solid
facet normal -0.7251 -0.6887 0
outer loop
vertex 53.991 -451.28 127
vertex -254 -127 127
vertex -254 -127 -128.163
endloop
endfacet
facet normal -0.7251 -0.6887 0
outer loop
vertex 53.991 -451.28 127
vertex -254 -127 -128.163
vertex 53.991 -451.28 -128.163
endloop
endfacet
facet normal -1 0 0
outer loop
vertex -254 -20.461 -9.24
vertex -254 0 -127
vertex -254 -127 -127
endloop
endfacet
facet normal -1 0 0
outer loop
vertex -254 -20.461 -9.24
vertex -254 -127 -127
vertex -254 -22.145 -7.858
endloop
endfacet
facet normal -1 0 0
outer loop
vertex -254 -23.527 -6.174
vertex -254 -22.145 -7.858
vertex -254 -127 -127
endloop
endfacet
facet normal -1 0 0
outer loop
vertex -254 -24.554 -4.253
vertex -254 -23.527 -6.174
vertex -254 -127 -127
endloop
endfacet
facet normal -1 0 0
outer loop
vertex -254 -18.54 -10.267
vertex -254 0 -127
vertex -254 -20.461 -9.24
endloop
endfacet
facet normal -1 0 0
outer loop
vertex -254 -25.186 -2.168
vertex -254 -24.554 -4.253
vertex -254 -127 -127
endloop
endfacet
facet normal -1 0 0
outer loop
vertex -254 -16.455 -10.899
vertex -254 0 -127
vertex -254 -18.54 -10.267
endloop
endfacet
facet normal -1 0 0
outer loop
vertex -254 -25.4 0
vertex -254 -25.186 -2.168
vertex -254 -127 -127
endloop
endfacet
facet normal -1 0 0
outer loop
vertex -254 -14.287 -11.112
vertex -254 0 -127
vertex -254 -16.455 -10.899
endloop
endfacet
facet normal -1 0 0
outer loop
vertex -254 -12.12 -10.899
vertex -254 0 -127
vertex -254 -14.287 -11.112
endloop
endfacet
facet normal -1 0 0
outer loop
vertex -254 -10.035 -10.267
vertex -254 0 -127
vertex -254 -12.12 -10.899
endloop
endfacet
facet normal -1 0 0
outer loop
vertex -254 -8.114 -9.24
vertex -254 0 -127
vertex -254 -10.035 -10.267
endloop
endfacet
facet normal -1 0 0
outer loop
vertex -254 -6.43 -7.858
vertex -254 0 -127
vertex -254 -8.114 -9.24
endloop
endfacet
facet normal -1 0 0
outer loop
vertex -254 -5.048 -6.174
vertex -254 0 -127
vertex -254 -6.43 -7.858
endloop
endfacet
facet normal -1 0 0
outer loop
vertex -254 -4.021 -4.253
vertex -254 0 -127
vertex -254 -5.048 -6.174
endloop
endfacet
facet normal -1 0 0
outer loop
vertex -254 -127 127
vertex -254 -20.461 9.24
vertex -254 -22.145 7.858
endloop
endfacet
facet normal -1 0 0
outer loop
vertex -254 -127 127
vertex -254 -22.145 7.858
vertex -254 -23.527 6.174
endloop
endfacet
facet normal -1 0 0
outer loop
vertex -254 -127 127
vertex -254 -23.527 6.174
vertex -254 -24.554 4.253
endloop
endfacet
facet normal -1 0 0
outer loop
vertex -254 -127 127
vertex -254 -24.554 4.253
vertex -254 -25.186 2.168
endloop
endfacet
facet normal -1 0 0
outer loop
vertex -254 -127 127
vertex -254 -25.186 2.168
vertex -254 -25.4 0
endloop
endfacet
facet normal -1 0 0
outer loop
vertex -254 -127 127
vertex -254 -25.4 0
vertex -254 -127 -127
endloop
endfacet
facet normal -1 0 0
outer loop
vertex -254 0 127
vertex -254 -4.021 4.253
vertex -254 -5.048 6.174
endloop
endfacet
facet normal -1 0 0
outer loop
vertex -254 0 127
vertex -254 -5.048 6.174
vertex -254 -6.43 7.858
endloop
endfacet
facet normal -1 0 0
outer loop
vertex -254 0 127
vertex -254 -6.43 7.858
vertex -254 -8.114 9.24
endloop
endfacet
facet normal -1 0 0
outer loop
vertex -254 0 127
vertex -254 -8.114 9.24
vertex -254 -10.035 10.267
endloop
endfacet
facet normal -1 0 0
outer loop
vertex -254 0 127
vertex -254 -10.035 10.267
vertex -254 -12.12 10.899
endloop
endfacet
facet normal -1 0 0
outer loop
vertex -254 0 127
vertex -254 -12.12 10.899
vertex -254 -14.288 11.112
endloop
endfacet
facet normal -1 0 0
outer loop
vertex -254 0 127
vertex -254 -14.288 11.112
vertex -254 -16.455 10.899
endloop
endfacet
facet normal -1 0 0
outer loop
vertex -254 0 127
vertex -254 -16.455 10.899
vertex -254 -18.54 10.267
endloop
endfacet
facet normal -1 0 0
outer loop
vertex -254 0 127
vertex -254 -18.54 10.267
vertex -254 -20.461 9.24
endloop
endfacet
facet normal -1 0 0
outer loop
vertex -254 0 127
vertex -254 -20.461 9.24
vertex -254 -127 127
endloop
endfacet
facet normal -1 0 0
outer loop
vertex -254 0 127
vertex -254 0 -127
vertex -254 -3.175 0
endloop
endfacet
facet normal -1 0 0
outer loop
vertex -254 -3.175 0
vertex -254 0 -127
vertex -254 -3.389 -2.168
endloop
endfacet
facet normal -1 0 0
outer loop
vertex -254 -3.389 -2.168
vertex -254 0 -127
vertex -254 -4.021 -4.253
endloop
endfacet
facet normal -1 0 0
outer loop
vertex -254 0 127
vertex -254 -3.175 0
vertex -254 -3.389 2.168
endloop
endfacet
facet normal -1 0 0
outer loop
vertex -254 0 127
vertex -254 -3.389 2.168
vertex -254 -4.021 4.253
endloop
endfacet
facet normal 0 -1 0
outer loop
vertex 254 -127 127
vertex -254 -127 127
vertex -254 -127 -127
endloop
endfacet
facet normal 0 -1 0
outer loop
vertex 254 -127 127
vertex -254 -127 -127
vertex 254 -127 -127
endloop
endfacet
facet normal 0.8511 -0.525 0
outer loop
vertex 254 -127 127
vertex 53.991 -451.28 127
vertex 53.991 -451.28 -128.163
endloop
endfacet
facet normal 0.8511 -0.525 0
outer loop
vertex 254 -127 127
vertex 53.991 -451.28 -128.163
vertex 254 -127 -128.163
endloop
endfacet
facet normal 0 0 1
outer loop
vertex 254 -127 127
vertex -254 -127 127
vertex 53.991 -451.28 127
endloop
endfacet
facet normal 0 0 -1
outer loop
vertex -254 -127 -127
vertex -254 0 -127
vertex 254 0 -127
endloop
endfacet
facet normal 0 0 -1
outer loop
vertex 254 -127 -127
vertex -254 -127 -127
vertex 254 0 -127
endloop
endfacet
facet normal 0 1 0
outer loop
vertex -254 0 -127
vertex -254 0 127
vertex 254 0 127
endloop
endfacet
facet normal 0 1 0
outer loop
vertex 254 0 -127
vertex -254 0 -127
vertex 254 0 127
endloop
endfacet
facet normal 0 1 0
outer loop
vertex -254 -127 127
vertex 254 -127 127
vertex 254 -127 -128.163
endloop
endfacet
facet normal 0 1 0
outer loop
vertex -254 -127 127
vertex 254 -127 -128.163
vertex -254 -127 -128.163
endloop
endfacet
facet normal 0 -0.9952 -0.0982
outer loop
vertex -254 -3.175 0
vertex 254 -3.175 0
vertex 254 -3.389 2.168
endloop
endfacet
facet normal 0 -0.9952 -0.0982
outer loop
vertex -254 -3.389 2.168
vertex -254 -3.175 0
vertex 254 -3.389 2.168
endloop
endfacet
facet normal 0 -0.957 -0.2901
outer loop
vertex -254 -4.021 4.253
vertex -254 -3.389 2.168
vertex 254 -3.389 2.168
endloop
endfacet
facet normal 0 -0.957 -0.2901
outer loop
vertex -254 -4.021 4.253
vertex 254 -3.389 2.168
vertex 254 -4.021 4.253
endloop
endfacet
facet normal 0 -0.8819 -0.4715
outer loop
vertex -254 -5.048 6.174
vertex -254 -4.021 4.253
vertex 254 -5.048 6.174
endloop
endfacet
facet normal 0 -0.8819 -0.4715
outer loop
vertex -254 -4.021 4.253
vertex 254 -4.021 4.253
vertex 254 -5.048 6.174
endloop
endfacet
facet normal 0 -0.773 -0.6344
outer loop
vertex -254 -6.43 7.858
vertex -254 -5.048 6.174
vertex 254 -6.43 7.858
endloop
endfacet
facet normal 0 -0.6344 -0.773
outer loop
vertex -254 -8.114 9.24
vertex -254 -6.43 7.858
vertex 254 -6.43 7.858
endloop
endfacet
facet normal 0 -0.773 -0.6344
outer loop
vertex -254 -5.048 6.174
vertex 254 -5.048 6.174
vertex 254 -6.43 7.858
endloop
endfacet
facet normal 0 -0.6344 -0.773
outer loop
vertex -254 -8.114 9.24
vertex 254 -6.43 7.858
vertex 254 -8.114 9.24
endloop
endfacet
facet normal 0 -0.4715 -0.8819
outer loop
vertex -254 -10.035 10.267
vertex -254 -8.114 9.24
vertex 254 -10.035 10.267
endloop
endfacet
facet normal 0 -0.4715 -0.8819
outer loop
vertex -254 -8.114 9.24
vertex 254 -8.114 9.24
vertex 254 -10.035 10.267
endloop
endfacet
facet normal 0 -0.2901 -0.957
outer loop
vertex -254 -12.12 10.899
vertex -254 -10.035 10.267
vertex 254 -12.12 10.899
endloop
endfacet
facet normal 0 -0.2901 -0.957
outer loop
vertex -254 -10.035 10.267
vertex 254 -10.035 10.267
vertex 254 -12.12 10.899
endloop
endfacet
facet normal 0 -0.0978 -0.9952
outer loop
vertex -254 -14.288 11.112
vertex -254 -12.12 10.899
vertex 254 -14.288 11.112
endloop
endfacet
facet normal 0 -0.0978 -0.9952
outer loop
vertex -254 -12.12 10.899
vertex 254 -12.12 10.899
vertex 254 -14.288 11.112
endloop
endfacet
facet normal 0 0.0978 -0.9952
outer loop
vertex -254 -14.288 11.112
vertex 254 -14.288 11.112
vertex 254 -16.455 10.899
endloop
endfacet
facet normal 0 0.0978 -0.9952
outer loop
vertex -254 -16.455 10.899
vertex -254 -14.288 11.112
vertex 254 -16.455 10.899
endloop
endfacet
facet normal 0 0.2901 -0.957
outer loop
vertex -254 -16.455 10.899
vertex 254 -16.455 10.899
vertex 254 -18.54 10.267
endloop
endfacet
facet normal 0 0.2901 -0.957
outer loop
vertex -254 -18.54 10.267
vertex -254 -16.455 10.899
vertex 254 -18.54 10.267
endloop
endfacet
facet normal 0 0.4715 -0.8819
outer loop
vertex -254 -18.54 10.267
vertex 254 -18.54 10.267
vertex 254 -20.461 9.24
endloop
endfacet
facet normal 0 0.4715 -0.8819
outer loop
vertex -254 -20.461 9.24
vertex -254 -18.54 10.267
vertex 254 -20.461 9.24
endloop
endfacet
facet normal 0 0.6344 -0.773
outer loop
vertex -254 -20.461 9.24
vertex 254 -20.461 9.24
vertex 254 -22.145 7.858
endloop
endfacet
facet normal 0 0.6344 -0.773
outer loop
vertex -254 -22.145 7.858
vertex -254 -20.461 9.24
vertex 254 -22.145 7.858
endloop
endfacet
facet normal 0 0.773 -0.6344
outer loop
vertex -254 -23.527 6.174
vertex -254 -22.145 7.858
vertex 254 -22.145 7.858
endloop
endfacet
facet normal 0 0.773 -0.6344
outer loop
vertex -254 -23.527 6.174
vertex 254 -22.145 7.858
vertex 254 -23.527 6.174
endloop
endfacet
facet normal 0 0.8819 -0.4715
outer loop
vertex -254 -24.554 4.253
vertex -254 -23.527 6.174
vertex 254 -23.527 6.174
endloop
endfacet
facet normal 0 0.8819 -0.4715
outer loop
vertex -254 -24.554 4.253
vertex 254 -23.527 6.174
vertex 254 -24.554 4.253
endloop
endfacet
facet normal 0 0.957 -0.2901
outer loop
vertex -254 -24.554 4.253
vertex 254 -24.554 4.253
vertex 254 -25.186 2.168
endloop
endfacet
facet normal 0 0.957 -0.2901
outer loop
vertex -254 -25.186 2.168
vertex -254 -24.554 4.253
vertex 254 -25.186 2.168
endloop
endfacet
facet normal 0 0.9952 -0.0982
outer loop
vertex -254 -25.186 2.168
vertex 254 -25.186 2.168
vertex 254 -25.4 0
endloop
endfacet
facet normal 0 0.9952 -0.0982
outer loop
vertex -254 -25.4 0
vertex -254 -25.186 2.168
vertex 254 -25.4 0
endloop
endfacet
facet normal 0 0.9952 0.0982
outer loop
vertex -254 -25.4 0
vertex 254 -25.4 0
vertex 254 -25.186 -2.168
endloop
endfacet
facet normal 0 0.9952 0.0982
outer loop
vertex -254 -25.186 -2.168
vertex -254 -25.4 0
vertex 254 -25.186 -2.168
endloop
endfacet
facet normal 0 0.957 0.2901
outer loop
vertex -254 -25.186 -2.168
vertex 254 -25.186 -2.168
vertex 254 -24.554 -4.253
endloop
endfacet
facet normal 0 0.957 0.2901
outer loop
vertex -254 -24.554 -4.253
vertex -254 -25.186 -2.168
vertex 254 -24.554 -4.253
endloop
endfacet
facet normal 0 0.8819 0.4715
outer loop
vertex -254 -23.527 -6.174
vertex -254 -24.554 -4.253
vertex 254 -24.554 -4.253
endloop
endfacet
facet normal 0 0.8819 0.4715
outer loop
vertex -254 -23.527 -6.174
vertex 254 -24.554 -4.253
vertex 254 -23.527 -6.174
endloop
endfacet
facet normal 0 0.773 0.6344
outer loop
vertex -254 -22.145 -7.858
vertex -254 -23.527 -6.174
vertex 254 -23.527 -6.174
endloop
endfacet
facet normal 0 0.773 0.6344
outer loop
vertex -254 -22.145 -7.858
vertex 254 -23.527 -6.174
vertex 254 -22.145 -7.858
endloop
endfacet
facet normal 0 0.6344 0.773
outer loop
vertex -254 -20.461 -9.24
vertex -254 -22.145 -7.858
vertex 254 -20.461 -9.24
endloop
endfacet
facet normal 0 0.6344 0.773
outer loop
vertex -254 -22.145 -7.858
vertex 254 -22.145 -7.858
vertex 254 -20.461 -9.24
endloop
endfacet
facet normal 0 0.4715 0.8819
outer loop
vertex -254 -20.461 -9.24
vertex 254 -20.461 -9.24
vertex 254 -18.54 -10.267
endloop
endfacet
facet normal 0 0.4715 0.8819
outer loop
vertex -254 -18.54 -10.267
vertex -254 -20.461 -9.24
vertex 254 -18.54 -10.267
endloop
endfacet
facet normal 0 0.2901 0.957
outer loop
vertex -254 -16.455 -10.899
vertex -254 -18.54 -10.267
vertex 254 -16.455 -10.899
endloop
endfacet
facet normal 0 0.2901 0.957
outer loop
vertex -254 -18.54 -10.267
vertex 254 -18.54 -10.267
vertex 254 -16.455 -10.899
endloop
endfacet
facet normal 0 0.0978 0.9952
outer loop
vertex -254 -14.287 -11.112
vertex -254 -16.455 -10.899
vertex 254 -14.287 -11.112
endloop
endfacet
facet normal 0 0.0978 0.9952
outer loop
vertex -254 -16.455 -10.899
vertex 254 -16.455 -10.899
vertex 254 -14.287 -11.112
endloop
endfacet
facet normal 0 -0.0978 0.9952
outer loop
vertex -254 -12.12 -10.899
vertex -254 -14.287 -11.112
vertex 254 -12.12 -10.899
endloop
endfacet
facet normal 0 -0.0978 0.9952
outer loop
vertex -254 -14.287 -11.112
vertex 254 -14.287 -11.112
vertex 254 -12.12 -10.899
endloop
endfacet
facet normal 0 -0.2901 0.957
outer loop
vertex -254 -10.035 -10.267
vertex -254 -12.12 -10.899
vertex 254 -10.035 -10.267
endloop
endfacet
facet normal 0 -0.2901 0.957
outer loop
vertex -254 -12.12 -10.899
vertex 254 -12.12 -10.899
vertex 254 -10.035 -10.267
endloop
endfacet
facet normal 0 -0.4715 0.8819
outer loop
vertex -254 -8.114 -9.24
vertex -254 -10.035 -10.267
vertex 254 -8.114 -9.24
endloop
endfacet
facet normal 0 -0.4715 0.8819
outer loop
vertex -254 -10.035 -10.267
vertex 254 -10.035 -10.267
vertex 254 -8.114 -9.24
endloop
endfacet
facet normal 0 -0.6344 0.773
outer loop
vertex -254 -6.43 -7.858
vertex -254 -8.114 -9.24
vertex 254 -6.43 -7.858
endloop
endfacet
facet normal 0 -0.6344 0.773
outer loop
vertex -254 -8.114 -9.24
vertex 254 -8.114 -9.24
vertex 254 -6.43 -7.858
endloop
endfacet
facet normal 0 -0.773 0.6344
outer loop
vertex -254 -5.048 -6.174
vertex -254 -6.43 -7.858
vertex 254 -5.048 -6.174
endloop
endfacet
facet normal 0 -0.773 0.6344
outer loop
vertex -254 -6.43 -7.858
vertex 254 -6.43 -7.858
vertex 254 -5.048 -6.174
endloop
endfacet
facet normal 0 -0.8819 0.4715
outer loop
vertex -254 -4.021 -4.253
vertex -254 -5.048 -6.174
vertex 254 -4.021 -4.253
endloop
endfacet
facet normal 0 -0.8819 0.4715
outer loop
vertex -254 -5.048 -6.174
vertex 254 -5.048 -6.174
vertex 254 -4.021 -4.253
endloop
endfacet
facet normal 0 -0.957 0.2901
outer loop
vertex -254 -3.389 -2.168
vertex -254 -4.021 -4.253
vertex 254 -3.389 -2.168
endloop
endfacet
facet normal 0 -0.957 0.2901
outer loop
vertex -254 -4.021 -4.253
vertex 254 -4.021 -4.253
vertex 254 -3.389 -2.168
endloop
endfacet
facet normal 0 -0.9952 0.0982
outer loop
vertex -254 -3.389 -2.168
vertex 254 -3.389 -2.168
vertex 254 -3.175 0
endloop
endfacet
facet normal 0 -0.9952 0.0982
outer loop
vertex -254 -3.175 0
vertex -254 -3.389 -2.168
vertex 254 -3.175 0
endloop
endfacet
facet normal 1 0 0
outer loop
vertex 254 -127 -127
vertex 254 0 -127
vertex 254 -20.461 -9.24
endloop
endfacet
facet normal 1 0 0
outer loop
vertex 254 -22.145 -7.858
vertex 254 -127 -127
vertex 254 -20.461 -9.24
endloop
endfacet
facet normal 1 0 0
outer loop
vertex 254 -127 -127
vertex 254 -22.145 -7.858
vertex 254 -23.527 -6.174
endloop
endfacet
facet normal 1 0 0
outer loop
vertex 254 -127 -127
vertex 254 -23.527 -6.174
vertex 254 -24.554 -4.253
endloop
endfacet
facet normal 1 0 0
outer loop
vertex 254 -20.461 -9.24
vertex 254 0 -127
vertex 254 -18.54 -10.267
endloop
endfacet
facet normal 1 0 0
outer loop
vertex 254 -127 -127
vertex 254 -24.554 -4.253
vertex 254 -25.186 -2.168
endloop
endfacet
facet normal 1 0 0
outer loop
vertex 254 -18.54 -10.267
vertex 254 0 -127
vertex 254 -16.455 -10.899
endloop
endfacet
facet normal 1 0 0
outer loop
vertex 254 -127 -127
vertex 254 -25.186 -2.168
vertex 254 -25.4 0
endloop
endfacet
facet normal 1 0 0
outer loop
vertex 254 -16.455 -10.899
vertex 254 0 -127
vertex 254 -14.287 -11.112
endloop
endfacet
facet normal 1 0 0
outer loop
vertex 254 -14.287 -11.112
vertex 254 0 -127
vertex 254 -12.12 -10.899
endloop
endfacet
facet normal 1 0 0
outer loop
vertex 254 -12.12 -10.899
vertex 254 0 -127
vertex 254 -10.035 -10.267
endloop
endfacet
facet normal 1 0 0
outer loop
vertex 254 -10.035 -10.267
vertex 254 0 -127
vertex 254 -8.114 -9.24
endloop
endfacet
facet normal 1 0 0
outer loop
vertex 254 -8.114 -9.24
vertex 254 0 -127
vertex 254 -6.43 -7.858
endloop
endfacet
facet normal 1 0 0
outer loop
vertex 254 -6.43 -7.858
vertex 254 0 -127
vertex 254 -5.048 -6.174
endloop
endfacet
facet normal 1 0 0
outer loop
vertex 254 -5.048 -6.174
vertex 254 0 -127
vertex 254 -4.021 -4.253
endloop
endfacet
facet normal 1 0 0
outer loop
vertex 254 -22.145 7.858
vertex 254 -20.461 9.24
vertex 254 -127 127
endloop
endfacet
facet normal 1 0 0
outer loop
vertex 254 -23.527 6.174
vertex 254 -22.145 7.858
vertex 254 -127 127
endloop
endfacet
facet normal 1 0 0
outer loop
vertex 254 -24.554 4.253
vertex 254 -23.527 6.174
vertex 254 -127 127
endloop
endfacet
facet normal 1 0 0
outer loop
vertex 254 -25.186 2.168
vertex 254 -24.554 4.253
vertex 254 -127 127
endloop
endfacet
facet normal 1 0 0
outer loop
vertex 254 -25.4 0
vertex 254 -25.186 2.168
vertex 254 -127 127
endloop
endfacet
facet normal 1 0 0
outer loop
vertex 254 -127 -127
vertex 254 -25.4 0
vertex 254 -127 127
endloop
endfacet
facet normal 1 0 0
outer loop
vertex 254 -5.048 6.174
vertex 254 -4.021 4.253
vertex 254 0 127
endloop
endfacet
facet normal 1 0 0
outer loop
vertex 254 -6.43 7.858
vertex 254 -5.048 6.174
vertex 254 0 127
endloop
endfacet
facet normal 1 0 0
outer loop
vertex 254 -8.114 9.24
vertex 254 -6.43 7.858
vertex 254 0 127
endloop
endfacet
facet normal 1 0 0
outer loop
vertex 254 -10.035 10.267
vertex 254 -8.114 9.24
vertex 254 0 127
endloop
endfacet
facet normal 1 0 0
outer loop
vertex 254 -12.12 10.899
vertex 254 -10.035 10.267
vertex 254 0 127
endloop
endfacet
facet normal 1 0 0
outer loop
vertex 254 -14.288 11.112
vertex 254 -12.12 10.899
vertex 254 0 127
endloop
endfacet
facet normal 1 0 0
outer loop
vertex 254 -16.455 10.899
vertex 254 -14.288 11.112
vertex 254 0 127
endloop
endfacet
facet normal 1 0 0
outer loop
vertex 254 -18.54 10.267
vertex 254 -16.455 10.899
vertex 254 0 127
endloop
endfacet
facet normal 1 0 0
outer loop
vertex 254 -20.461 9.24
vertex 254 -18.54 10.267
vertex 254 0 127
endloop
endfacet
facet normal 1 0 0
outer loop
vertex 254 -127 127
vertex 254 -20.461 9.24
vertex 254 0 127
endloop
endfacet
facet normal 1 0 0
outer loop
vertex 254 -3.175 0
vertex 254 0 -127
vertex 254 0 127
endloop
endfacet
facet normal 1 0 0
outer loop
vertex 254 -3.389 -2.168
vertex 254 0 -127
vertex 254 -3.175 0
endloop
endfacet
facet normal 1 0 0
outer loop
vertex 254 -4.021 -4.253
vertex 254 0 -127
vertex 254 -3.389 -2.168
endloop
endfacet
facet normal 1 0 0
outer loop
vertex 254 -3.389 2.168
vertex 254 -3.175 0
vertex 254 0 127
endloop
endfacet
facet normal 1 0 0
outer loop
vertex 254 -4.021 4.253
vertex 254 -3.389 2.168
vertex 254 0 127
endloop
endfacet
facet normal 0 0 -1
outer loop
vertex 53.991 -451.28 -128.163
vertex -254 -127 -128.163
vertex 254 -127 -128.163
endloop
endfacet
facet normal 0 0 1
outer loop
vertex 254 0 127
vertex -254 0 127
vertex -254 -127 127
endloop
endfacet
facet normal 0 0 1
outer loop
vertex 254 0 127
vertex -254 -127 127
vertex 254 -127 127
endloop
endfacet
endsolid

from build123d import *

# Parameters (mm, degrees)
F0_W     = 508
F0_H     = 254
F1_DEPTH = 127
F3_DEPTH = 255.16283
F4_R     = 25.4
F5_DEPTH = 897.97855
F6_R     = 11.1125
F7_DEPTH = 986.37929


with BuildPart() as f1:
    # F0 (on Front) → F1 (new body)
    with BuildSketch(Plane.XZ):
        Rectangle(F0_W, F0_H)
    extrude(amount=F1_DEPTH)

    # F4 (on face) → F5 (cut)
    with BuildSketch(Plane(origin=(-254, 0, 0), x_dir=(0, -1, 0), z_dir=(-1, 0, 0))):
        with Locations((23.774409228, 0)):
            Circle(F4_R)
    extrude(amount=F5_DEPTH, mode=Mode.SUBTRACT)

    # F6 (on face) → F7 (cut)
    with BuildSketch(Plane.YZ.offset(254)):
        with Locations((-14.2875, 0)):
            Circle(F6_R)
    extrude(amount=-F7_DEPTH, mode=Mode.SUBTRACT)


with BuildPart() as f3:
    # F2 (on face) → F3 (new body)
    with BuildSketch(Plane.XY.offset(127)):
        Polygon((53.9908080281, -451.2796989125), (254, -127), (-254, -127), align=None)
    extrude(amount=-F3_DEPTH)


solid = Compound([f1.part, f3.part])
